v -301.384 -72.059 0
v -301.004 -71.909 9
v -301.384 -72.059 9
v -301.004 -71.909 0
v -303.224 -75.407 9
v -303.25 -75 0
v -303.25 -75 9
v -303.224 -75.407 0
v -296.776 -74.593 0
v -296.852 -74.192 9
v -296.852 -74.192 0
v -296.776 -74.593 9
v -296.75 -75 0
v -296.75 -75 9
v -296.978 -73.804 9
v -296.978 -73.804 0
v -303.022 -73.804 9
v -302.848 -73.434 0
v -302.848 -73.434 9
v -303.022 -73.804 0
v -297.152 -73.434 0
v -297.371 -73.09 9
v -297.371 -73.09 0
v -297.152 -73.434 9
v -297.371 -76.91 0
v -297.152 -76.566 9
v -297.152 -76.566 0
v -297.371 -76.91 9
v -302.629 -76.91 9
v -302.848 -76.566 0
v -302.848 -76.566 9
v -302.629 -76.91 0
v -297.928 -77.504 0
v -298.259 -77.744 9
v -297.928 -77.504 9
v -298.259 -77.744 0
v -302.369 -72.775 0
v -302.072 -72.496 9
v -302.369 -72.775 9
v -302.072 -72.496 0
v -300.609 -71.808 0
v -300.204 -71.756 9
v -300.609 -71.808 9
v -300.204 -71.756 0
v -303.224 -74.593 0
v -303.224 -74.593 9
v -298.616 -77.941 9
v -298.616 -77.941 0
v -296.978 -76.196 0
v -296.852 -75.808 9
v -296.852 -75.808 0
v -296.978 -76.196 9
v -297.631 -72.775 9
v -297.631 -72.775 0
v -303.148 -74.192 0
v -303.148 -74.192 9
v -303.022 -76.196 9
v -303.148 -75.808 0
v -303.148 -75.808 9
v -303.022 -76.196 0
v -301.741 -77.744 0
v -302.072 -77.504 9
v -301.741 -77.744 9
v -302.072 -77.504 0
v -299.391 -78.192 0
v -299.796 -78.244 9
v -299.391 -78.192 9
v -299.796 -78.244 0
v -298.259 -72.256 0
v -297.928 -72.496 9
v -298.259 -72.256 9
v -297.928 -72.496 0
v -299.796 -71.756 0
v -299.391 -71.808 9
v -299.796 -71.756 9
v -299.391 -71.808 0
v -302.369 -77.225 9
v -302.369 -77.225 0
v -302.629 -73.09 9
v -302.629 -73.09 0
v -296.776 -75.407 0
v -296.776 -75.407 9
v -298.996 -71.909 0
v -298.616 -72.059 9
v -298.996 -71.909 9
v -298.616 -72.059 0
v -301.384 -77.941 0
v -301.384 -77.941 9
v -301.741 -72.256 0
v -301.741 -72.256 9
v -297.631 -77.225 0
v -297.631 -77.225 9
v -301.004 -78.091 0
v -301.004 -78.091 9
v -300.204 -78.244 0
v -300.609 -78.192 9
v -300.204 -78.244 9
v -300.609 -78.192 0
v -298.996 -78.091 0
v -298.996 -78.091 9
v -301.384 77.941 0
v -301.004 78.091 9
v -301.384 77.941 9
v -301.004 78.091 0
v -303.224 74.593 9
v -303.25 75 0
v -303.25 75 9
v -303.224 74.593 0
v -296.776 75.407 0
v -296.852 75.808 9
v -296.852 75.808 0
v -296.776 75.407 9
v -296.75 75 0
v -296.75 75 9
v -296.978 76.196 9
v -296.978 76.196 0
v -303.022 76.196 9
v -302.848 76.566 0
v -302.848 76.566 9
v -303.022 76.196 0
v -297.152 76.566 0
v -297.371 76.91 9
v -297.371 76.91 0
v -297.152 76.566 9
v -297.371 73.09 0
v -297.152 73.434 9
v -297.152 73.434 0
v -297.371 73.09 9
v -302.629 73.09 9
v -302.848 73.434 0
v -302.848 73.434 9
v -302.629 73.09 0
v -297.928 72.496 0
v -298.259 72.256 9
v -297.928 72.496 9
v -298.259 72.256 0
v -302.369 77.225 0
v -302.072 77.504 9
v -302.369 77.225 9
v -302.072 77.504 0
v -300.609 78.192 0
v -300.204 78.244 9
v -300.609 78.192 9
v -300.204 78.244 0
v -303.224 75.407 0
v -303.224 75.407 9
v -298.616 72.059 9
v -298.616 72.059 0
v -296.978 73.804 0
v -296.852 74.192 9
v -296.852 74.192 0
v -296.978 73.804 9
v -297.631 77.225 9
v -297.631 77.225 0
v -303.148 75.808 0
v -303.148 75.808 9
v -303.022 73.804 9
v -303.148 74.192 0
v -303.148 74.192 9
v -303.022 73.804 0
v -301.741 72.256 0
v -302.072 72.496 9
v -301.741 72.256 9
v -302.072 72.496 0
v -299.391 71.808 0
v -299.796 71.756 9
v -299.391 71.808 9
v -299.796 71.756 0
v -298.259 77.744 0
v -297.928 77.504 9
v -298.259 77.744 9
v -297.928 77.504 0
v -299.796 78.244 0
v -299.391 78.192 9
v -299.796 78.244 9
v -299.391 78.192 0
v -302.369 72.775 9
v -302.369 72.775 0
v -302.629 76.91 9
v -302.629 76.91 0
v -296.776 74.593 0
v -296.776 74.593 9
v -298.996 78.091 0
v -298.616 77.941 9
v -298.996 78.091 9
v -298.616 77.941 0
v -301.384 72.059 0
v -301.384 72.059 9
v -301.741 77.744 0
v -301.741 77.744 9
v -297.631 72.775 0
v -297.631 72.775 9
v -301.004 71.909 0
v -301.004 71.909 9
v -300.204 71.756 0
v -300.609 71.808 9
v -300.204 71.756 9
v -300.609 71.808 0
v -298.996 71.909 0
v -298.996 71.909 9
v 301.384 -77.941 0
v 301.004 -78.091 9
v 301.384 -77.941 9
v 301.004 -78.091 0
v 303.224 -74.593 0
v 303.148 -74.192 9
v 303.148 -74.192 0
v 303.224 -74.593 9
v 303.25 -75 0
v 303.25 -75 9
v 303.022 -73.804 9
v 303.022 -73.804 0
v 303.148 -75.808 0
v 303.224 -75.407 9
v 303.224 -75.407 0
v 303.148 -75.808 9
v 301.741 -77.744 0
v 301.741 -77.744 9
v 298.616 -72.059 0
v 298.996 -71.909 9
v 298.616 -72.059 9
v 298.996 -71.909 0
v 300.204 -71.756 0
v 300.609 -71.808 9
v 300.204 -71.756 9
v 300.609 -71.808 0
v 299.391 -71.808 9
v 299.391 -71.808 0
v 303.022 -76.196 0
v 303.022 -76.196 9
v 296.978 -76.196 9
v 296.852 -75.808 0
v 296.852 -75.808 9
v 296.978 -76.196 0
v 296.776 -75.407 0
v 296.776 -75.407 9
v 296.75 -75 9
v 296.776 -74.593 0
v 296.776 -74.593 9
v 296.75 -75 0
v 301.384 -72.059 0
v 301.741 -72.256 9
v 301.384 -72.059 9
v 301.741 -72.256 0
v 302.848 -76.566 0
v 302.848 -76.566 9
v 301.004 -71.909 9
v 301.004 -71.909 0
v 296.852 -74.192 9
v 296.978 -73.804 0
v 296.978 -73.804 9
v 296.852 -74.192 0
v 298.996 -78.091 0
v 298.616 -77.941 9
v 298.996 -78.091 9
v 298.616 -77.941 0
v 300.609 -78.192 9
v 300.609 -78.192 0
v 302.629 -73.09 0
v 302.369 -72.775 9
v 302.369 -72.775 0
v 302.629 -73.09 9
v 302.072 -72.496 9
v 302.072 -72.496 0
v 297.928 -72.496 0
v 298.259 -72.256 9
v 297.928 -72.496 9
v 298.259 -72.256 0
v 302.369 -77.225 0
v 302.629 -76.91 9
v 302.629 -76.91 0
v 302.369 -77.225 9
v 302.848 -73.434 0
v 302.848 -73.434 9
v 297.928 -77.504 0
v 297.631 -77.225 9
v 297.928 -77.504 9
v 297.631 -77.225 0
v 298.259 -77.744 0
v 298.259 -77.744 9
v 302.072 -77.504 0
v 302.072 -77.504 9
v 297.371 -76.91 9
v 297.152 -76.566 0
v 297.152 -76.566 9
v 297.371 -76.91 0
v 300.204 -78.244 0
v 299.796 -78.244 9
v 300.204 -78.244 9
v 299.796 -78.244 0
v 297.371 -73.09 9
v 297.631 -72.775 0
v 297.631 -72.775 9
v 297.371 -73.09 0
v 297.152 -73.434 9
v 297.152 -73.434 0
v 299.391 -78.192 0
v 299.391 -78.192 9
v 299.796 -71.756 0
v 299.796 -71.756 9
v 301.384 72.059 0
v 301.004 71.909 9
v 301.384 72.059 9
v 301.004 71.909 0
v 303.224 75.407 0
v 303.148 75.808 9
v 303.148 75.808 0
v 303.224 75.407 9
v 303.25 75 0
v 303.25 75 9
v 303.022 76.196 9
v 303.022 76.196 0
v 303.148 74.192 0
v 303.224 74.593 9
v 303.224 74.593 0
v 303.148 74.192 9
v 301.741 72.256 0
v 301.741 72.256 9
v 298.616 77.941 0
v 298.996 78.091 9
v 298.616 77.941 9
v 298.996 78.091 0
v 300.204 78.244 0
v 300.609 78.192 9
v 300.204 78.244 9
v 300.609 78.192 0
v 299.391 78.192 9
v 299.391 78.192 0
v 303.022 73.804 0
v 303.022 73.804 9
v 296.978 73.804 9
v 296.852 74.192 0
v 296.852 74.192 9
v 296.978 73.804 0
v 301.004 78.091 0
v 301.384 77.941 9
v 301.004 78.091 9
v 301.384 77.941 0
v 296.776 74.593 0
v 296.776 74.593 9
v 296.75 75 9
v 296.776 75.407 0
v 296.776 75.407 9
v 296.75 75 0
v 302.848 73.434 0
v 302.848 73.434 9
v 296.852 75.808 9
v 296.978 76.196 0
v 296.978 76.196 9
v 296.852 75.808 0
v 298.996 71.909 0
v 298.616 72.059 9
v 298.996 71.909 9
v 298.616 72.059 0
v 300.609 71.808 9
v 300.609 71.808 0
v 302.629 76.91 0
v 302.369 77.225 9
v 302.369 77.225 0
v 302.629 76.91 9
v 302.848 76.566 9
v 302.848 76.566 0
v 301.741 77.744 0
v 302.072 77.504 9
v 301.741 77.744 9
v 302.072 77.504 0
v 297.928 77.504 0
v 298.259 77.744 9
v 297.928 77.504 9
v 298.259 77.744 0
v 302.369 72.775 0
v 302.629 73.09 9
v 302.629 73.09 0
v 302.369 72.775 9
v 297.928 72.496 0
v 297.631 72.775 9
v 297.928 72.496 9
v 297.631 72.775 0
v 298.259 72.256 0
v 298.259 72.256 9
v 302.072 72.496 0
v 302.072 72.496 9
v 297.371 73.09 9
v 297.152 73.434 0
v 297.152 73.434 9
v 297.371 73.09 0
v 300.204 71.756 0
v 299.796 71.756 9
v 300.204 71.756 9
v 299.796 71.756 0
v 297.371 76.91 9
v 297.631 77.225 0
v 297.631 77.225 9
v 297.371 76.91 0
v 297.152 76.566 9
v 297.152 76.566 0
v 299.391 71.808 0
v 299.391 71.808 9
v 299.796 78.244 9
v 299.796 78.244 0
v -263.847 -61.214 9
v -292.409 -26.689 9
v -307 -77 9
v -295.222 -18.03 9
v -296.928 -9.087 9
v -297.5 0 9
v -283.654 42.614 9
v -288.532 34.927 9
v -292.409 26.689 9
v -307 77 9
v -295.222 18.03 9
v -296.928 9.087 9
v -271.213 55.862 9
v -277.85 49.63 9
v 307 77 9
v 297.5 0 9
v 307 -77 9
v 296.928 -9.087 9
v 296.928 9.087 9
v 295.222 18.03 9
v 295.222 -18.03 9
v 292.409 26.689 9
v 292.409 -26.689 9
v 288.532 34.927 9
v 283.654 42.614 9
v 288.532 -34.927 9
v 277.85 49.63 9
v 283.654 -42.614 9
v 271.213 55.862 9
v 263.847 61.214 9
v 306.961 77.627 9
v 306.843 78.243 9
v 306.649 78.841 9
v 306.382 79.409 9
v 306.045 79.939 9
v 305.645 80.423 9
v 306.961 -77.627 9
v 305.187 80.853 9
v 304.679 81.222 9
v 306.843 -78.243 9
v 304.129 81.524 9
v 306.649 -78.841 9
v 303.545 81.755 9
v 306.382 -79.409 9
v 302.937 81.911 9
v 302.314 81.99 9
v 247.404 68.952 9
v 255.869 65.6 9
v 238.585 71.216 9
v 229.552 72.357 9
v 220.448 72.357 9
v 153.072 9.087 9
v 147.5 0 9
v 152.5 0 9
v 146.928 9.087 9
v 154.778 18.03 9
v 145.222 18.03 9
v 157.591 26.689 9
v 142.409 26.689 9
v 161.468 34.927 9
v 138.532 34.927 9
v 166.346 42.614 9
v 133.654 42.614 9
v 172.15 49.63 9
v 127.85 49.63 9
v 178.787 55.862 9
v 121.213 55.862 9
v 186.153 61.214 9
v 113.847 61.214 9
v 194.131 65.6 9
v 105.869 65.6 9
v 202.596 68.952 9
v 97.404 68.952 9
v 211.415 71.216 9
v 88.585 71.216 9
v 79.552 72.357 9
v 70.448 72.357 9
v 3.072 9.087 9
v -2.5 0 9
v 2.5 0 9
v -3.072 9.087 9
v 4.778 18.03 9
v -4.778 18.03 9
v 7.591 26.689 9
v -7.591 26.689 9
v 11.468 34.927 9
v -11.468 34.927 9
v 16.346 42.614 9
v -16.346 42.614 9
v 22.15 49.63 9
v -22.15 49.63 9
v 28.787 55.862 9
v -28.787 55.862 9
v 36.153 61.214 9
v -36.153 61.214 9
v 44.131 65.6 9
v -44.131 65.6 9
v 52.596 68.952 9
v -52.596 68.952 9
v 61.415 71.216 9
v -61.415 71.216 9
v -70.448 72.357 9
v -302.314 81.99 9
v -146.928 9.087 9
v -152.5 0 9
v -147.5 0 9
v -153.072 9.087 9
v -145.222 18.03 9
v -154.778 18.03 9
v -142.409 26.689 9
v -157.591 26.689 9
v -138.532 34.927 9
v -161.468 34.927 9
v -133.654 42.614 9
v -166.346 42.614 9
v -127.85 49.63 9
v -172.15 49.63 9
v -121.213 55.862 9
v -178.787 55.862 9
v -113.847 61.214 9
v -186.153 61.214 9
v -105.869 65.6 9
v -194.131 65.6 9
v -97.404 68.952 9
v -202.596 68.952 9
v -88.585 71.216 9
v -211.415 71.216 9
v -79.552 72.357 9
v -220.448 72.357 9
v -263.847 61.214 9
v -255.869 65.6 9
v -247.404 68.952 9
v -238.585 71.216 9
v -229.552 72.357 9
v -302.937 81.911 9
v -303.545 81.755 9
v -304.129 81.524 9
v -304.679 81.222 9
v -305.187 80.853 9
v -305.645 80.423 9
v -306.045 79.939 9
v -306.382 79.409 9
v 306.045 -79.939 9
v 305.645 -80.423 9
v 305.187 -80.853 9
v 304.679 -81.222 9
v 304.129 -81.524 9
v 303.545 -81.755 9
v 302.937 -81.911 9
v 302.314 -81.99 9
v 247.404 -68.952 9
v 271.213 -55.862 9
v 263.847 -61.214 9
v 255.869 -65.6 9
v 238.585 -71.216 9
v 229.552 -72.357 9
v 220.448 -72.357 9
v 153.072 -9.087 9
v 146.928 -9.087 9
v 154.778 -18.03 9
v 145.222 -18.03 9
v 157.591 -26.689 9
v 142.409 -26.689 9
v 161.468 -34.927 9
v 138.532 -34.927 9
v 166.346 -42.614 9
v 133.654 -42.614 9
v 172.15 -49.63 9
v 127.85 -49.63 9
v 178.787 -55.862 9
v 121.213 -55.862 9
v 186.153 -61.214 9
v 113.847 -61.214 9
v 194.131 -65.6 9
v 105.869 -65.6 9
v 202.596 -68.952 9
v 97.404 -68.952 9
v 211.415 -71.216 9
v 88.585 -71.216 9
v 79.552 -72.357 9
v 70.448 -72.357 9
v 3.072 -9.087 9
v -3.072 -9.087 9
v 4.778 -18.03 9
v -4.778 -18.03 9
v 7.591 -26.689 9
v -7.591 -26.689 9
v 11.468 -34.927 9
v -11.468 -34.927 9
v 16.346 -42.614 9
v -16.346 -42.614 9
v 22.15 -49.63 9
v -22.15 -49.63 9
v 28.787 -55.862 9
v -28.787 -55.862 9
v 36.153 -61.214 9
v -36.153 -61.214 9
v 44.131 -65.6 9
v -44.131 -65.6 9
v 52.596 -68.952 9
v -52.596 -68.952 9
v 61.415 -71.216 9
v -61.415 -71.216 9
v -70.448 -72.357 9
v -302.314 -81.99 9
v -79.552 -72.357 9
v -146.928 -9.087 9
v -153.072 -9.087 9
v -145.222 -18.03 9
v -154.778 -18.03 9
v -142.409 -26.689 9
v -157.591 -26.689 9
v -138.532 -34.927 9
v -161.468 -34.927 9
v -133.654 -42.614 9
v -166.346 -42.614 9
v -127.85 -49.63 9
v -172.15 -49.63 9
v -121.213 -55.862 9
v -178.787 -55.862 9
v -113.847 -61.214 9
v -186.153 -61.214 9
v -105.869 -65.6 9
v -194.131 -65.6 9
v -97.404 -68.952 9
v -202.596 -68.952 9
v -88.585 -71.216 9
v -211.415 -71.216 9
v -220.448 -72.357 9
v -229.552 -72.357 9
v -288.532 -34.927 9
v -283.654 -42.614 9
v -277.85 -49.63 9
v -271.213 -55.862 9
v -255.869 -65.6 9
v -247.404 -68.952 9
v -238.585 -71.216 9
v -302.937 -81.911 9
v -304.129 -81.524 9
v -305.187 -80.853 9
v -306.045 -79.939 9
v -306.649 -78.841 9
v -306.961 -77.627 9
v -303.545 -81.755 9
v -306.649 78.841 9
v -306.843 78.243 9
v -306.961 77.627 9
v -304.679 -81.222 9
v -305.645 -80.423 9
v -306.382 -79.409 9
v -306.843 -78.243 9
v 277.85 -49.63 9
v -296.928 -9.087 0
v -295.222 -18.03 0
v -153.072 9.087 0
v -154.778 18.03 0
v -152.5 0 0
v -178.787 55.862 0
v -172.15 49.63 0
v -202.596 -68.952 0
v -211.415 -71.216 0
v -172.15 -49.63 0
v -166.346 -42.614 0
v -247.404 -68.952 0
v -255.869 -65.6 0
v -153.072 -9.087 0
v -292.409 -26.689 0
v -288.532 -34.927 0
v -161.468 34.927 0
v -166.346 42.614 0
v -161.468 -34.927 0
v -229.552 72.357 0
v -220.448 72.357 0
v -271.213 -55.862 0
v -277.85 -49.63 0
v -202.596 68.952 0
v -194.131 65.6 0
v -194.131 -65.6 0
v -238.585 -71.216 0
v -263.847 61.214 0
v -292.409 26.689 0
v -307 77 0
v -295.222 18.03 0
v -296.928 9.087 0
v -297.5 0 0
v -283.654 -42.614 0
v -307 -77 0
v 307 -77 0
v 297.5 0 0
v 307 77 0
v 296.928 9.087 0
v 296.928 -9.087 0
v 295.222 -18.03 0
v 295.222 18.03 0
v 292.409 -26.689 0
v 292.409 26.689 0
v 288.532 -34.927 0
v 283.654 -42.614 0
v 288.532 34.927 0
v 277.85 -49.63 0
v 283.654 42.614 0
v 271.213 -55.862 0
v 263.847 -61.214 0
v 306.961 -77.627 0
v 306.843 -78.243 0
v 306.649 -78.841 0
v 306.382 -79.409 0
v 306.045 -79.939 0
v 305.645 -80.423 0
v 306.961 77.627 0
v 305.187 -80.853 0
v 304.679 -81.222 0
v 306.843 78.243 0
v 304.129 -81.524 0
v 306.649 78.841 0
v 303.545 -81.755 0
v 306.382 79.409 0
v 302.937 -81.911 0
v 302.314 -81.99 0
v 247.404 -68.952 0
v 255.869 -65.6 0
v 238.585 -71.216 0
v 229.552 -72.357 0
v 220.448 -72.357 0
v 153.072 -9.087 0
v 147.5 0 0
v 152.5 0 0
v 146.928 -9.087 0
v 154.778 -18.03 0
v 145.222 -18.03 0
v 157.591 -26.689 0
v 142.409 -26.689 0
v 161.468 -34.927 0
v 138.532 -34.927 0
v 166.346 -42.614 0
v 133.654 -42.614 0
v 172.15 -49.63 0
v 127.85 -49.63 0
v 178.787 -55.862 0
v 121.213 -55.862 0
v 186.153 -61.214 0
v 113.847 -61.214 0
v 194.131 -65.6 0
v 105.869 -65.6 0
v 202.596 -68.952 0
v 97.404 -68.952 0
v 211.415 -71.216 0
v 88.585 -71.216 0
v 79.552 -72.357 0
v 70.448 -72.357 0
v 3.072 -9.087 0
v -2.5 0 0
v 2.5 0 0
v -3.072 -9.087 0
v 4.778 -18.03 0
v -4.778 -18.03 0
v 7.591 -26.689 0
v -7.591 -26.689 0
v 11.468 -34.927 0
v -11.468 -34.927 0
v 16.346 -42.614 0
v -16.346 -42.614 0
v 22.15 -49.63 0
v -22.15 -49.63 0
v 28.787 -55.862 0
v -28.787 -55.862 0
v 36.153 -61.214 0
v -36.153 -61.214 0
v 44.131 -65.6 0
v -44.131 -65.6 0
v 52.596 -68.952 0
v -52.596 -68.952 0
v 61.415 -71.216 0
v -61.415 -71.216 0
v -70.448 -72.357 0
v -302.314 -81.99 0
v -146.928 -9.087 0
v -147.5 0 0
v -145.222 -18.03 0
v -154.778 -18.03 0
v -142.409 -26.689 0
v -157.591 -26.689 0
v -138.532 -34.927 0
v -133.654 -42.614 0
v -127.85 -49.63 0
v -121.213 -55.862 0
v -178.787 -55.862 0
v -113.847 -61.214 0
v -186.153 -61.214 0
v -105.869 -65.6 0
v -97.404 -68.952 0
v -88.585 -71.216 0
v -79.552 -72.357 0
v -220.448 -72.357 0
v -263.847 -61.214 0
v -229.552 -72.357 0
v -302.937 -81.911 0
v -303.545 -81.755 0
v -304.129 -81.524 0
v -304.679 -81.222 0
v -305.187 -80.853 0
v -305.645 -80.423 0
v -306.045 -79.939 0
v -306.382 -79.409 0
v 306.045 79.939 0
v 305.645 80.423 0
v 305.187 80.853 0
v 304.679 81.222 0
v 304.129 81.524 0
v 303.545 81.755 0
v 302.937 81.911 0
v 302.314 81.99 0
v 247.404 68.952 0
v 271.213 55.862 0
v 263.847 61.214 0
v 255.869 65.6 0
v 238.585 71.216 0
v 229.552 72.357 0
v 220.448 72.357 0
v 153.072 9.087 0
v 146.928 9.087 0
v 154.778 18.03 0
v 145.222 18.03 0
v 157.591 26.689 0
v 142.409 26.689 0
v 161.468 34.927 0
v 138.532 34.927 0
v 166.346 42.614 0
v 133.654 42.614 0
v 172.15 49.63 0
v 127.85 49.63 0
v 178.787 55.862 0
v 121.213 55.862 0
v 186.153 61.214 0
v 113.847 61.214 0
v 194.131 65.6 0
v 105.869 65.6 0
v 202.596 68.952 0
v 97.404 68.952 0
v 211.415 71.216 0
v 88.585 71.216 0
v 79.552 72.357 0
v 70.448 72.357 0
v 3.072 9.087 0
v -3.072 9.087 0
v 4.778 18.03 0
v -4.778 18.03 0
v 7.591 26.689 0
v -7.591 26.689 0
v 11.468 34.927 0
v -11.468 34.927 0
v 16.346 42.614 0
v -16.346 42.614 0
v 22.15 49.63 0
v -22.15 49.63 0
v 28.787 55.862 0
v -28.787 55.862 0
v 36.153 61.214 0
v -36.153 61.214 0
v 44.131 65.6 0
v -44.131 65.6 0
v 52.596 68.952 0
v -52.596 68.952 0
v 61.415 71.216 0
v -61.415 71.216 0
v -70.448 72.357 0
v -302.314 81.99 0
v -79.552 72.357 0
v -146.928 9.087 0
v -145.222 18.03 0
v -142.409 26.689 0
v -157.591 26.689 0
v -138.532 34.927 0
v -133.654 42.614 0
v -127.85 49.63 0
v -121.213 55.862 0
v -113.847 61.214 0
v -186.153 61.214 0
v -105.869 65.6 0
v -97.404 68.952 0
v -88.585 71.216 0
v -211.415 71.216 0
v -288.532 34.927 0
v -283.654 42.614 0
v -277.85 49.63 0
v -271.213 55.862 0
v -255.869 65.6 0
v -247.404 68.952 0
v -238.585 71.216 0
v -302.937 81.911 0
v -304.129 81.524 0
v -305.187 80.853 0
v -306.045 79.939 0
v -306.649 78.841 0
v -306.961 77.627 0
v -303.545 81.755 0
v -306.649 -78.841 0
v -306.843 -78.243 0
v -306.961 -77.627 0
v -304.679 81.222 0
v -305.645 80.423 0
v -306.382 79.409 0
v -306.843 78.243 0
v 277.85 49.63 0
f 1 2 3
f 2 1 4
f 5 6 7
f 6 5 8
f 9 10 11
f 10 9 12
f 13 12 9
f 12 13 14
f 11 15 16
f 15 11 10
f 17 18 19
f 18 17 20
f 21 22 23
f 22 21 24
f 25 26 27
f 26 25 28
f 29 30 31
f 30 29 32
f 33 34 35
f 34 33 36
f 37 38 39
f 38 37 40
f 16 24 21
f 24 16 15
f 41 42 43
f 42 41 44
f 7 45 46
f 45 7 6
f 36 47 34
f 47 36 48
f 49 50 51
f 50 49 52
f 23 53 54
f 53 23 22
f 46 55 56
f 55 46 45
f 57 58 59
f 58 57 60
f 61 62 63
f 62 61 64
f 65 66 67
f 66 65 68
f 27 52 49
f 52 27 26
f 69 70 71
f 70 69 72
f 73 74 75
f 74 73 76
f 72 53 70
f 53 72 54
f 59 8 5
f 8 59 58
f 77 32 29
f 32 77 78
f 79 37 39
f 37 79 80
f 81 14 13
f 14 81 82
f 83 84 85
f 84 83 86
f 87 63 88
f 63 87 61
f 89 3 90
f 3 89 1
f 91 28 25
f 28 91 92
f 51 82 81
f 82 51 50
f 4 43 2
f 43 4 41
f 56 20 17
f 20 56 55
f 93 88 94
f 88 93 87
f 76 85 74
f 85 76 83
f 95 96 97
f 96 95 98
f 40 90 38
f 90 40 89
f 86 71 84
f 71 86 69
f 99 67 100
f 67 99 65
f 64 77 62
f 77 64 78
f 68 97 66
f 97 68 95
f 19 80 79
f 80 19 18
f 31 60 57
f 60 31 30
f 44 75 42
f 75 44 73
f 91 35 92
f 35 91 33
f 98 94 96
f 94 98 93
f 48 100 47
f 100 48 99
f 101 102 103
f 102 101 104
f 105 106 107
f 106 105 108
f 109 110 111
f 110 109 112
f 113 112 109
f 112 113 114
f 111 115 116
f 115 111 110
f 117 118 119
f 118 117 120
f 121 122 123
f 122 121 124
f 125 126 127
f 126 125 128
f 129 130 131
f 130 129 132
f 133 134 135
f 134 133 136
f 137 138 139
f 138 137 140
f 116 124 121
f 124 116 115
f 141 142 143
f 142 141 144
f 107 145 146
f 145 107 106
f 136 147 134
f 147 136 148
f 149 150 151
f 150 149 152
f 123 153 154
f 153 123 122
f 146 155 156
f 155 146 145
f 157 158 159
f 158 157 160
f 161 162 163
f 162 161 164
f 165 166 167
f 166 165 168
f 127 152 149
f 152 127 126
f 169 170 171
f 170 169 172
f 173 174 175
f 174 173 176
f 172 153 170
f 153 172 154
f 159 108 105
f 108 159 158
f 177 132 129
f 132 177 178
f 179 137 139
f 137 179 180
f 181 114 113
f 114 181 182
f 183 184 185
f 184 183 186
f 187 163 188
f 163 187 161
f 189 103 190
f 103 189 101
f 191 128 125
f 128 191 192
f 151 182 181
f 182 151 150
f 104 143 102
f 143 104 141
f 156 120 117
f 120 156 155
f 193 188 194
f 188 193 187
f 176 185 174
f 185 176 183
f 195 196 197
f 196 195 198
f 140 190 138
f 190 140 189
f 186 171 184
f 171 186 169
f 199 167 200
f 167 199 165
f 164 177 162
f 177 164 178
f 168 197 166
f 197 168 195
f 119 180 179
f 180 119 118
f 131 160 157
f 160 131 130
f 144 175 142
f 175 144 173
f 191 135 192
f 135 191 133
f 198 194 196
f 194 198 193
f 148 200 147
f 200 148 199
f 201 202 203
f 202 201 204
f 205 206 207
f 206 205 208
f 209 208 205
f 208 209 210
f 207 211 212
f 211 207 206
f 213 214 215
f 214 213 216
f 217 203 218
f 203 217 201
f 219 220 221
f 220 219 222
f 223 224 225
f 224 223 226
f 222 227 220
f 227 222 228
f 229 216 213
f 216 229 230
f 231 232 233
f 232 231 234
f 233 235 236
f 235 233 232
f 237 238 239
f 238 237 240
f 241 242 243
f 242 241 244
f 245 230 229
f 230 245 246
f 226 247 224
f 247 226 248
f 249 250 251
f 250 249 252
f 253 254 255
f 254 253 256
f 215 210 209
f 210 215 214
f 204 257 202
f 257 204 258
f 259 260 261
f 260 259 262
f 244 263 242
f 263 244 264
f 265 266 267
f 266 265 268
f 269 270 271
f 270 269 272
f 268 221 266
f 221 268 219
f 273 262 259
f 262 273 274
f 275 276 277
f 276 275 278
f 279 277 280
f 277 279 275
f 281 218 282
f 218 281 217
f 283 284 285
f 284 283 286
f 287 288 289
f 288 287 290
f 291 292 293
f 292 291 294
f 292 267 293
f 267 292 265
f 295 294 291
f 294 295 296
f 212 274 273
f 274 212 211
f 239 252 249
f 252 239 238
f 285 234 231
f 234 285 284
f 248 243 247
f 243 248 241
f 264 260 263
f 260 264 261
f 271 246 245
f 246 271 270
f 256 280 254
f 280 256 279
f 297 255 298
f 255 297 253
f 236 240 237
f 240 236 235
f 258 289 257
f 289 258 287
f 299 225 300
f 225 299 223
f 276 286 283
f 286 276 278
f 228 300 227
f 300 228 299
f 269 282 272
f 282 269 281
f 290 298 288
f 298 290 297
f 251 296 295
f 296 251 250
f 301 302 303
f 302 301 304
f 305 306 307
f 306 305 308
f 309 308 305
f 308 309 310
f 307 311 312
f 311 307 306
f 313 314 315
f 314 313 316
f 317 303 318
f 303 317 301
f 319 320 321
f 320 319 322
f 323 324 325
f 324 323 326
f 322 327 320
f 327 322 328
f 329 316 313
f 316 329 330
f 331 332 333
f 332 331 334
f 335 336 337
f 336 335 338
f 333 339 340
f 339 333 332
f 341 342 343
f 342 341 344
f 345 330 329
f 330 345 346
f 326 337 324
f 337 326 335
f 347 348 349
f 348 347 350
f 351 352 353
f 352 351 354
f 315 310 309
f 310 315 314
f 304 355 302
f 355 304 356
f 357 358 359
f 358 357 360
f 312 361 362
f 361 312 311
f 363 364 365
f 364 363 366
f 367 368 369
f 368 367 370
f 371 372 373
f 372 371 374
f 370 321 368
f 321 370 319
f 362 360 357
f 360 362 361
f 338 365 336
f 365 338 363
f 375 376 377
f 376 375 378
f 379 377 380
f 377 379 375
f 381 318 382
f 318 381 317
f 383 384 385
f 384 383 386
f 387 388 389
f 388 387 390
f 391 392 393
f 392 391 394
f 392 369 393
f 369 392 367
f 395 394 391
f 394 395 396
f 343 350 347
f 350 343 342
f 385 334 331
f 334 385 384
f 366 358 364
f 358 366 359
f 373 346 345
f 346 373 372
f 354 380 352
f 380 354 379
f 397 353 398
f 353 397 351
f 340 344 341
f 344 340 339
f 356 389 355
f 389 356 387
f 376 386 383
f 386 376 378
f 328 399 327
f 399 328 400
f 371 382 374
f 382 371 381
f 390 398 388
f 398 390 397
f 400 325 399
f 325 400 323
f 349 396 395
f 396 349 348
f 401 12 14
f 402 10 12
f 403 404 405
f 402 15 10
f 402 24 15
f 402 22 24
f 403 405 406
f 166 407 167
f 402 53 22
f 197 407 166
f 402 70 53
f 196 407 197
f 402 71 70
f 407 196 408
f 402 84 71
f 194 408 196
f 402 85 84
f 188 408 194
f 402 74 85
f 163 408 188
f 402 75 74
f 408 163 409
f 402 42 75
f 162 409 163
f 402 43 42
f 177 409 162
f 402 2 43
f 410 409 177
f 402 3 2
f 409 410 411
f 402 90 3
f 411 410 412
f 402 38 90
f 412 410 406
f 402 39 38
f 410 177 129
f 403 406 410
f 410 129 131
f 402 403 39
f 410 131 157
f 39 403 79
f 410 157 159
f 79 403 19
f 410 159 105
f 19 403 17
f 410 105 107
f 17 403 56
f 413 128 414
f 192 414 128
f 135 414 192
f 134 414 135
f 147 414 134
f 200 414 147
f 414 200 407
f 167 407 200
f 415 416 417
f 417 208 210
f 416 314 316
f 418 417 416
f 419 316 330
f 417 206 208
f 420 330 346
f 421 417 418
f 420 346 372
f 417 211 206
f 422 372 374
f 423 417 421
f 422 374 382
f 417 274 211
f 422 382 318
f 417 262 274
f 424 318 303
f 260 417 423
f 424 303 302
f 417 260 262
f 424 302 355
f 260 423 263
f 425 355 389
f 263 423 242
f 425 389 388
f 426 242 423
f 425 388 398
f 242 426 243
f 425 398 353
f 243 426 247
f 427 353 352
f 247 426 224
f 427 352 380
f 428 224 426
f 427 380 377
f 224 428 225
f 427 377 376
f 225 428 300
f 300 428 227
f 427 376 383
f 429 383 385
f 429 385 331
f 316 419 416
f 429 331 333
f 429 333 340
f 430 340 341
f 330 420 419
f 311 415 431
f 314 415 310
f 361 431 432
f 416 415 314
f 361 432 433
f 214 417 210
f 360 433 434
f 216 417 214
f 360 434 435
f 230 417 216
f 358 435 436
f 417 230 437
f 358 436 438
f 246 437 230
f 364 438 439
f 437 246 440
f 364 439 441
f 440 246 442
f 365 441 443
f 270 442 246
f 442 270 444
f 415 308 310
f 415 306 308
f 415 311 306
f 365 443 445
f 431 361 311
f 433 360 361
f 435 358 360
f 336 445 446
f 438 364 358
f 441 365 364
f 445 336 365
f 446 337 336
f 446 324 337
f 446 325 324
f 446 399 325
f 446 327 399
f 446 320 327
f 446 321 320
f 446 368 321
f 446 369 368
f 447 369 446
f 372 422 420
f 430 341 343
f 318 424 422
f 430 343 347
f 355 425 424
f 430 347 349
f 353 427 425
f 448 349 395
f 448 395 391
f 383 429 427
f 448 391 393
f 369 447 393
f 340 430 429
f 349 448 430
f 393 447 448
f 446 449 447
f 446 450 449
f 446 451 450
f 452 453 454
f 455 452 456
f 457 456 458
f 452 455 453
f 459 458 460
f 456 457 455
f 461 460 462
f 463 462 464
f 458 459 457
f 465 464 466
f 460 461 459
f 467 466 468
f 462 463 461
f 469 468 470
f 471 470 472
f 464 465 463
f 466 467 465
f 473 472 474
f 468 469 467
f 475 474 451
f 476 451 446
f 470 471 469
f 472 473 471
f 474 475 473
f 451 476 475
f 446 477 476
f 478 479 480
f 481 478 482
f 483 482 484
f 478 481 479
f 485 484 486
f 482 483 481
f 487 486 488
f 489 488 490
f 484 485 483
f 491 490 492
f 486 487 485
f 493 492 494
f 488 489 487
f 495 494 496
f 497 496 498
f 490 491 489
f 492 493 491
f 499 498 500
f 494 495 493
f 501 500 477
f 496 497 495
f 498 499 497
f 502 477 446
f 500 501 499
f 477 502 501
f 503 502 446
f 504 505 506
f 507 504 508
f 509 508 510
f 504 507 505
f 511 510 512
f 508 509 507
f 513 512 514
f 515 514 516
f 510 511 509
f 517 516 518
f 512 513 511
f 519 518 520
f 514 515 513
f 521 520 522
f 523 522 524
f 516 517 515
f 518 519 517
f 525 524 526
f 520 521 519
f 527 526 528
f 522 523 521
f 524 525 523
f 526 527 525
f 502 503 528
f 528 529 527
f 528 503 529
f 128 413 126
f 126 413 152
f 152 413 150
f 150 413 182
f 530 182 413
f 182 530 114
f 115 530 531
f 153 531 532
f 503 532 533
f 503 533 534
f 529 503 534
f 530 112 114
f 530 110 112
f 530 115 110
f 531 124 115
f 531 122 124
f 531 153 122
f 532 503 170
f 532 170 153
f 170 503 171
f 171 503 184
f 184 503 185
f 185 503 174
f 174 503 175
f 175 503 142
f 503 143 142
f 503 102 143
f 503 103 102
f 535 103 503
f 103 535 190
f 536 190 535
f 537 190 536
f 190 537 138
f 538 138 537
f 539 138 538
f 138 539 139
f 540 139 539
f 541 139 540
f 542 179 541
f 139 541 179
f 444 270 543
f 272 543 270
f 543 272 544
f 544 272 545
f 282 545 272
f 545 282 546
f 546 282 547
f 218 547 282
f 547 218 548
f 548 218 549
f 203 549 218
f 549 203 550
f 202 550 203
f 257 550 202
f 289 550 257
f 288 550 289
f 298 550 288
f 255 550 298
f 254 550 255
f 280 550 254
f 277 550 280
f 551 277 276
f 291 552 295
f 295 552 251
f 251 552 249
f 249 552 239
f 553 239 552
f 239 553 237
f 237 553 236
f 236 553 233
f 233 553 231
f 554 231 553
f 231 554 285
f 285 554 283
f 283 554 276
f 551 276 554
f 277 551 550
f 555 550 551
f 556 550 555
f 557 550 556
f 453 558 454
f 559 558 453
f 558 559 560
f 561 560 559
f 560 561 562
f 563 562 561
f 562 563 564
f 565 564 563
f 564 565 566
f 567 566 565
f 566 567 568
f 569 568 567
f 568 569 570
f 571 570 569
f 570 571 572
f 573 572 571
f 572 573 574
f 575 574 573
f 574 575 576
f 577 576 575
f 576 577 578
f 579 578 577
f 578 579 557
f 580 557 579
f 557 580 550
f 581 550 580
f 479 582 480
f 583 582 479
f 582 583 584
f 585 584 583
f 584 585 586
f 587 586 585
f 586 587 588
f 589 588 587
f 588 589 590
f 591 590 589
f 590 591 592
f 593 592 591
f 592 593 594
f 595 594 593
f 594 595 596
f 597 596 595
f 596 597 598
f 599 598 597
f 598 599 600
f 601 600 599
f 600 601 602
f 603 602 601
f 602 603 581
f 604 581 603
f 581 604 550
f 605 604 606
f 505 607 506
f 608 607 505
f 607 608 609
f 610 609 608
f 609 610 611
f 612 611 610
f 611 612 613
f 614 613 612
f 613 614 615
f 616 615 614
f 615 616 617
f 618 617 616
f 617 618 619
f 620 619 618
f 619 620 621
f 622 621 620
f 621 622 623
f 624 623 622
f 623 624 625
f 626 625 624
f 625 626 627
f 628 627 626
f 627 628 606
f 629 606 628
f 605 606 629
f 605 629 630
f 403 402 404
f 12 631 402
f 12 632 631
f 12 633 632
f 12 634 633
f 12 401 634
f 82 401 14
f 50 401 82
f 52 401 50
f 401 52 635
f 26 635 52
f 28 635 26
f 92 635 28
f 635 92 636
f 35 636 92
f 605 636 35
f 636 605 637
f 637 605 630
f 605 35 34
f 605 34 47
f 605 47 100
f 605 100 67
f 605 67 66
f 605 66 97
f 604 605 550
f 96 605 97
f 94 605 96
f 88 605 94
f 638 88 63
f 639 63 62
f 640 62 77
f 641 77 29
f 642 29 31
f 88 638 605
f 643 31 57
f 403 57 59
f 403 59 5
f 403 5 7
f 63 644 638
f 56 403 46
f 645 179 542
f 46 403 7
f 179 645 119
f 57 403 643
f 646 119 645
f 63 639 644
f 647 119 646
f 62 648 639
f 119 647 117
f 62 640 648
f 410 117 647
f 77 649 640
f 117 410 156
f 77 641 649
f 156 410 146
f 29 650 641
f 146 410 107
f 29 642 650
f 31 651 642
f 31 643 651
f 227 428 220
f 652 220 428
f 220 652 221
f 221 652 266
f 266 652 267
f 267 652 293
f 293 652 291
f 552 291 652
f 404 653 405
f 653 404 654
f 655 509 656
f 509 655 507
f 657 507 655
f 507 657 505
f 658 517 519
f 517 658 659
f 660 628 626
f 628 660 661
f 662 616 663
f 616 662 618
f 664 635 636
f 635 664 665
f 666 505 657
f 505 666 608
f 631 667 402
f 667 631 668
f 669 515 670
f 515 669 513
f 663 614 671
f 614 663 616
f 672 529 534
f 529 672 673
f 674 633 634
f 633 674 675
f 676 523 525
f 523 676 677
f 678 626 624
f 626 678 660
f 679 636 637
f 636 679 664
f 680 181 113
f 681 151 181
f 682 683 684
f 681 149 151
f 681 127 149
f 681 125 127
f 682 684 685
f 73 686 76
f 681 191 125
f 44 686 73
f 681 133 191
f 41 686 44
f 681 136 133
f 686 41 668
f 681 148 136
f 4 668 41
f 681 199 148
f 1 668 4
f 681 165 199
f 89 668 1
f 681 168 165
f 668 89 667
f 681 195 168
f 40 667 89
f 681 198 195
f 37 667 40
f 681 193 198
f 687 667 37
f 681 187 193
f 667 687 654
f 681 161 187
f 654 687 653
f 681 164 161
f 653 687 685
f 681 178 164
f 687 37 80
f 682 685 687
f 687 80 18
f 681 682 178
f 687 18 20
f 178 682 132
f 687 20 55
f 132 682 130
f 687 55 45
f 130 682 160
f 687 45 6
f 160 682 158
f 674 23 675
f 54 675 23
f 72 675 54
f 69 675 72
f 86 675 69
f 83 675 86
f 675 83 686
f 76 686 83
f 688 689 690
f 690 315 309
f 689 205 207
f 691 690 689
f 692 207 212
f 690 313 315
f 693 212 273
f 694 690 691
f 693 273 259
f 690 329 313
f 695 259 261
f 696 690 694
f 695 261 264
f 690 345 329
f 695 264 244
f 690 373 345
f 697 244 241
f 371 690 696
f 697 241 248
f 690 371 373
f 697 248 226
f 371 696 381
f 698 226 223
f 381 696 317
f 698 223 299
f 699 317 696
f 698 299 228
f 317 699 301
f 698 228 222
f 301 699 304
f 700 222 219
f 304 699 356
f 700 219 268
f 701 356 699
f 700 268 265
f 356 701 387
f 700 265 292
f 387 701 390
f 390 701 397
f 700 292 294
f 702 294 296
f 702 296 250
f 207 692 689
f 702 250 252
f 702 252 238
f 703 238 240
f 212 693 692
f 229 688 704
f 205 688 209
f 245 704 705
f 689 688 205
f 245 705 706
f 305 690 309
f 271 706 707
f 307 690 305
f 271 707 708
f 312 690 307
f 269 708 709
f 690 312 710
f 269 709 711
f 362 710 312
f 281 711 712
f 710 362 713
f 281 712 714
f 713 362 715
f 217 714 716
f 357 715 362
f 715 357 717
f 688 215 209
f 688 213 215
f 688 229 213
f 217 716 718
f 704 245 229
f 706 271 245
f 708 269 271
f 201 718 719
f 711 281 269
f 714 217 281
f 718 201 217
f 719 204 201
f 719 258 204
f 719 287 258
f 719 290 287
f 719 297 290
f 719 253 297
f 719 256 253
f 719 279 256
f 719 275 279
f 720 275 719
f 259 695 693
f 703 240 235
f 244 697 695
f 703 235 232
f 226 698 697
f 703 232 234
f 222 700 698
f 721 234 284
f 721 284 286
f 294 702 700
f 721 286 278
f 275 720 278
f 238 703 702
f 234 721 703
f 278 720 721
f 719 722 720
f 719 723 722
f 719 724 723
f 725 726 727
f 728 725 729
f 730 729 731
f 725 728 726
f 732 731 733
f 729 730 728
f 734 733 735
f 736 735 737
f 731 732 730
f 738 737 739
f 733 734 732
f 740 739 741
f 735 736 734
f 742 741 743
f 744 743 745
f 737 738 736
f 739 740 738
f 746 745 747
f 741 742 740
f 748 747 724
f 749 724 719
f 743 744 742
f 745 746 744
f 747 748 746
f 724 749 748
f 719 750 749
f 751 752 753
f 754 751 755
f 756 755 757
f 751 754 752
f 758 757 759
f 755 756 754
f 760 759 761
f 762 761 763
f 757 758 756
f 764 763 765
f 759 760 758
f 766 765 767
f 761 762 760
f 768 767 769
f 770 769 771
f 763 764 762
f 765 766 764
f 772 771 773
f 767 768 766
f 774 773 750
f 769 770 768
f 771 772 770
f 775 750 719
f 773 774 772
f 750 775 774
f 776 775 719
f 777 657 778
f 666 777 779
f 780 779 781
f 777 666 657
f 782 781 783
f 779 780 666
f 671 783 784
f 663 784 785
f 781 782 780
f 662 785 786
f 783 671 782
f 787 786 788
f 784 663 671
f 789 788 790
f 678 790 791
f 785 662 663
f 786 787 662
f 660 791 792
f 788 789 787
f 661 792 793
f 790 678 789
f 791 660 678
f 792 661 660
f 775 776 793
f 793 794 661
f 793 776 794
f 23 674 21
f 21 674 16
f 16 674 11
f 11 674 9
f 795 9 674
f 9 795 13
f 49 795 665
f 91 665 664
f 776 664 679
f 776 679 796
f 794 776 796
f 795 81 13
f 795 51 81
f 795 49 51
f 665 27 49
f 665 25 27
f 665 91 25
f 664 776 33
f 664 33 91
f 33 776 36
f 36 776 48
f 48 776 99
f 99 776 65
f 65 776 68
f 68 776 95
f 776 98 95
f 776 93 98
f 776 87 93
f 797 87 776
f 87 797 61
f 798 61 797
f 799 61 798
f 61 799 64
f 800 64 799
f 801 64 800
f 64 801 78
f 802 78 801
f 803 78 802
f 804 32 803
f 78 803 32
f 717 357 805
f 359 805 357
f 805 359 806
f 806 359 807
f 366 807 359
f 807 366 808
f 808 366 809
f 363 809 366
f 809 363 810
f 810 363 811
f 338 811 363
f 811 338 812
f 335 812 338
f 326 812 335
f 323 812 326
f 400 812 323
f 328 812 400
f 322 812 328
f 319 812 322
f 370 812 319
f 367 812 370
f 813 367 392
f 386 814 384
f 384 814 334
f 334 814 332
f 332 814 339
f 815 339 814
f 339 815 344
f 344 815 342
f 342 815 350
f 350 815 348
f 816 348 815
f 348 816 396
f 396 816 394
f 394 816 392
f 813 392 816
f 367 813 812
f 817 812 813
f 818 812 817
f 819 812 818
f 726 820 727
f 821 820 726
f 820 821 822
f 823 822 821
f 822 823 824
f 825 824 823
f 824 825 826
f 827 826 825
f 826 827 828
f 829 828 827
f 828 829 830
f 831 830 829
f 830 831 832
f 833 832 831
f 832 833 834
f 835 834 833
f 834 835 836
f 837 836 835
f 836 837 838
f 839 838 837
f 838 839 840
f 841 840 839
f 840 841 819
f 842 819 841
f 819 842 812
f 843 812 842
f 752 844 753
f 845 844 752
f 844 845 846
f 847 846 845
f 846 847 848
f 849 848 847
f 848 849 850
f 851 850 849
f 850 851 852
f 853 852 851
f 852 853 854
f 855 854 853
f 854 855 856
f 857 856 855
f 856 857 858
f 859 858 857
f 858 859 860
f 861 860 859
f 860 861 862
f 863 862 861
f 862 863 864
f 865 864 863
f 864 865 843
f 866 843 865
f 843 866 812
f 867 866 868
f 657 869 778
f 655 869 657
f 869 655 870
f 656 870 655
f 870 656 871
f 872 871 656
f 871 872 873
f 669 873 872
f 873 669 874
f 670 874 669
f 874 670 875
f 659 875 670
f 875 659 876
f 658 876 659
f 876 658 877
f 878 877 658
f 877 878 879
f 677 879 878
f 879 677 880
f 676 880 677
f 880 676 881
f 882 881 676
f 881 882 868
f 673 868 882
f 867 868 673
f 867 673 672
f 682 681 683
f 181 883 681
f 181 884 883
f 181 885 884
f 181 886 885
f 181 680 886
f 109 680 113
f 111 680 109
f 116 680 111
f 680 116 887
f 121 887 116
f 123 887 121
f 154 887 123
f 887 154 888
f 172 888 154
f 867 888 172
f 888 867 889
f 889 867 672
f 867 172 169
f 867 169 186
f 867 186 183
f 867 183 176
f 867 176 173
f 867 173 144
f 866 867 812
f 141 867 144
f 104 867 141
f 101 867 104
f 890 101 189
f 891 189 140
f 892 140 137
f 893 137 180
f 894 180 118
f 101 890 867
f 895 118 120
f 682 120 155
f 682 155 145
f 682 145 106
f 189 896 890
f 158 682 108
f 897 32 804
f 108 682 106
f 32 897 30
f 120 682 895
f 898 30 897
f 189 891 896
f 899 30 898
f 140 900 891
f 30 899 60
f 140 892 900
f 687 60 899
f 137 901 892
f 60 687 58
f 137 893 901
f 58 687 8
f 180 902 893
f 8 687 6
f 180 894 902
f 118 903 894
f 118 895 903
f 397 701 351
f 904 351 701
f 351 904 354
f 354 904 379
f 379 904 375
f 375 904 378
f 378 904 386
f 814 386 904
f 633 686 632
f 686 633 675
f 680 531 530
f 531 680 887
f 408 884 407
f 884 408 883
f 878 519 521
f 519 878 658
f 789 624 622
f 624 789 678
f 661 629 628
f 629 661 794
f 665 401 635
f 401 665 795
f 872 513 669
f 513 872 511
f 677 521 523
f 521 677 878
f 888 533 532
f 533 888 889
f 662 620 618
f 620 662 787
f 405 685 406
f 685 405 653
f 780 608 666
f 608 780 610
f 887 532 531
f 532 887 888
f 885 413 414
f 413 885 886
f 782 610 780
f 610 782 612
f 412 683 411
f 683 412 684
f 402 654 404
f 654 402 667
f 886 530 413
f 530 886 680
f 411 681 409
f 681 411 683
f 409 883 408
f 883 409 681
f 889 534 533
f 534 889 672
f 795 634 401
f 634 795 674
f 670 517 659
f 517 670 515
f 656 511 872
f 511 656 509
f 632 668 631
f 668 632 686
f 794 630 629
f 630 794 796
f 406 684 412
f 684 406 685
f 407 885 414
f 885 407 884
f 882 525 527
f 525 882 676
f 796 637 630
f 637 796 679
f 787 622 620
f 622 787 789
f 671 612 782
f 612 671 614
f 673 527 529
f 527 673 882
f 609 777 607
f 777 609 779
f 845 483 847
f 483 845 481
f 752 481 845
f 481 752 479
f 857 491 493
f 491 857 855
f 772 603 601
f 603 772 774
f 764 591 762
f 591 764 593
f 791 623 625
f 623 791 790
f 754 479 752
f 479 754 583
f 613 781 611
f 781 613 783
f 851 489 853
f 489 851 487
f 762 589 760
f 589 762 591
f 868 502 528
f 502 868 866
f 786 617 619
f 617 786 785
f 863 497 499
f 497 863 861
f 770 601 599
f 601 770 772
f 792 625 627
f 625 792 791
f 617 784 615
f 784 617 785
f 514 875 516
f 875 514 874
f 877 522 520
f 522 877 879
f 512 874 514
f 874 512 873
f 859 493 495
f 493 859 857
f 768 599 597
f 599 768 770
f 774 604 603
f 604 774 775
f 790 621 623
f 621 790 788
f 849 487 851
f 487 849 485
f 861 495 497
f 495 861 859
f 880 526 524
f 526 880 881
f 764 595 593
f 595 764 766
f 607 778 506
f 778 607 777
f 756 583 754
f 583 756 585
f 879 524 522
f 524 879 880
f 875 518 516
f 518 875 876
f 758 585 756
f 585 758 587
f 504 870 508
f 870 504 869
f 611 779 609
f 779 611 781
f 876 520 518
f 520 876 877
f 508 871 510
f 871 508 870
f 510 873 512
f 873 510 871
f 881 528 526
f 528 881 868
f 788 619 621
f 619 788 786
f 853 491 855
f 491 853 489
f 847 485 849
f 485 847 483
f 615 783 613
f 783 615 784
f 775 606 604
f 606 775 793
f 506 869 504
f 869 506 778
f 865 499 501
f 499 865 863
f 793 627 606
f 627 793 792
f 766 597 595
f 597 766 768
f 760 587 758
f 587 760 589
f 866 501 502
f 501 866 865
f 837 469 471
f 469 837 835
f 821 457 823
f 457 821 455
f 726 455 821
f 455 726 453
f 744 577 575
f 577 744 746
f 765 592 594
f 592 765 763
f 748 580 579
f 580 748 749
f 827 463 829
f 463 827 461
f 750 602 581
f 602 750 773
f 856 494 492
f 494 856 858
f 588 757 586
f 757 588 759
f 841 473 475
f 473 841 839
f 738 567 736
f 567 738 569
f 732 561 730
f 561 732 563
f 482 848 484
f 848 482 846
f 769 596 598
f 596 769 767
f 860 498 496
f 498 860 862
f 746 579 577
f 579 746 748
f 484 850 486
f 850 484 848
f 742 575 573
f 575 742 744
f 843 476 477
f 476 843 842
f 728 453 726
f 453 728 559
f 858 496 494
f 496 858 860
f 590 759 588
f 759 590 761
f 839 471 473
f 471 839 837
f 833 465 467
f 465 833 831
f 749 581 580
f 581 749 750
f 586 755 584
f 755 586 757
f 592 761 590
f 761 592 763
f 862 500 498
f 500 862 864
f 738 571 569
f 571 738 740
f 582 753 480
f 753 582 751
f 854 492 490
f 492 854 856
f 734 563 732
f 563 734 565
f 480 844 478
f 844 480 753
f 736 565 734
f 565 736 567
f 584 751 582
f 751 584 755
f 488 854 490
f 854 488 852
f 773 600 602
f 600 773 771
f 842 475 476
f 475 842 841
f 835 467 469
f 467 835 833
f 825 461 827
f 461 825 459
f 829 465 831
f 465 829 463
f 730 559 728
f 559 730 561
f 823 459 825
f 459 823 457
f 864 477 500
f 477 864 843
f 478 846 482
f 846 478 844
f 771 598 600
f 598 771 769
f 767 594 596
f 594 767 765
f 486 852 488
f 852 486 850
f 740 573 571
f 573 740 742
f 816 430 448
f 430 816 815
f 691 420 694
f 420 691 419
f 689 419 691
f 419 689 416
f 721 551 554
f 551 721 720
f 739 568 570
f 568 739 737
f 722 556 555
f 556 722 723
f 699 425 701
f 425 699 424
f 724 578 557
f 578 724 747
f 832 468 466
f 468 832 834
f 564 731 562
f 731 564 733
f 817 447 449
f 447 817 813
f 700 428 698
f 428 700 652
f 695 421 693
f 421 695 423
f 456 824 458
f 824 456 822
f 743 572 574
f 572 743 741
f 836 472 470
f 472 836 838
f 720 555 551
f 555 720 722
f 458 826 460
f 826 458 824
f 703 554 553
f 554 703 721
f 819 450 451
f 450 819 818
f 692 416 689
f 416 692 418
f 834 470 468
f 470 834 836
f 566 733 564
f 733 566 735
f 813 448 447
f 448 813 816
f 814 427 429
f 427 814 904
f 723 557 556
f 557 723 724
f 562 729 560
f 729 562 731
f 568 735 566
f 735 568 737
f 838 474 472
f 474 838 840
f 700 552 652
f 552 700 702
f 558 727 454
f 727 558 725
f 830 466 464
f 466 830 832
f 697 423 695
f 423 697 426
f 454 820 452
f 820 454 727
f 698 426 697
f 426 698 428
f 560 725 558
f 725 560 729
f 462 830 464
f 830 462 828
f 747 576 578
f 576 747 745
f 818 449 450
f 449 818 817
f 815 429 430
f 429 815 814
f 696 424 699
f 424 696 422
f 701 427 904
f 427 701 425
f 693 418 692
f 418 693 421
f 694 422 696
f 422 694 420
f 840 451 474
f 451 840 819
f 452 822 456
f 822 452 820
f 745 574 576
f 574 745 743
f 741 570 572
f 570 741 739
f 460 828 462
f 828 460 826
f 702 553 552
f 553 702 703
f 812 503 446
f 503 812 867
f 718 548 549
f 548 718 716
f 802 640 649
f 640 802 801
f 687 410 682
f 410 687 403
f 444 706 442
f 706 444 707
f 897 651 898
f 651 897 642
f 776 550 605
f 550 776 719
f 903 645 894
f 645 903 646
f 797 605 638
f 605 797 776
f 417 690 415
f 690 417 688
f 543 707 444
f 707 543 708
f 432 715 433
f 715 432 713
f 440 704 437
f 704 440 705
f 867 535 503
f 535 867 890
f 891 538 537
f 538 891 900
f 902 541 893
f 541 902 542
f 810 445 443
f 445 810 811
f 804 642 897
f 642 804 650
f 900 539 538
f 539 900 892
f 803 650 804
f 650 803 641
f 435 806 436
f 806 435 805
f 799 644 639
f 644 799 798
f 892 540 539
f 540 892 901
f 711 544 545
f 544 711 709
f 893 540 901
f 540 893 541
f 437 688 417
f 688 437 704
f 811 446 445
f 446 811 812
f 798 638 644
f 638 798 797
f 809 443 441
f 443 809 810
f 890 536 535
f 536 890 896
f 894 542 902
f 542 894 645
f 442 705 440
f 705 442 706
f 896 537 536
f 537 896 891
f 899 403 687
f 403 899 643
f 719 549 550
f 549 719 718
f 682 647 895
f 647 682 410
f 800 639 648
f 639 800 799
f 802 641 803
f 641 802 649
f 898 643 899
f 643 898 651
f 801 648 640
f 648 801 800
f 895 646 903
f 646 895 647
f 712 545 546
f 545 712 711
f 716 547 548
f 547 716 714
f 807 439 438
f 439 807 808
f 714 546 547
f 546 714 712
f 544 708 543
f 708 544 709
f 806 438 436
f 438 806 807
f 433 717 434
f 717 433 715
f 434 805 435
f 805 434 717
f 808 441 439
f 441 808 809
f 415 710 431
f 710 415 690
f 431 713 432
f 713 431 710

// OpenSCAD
$fn = 50;

difference() {
	union() {
		hull() {
			translate(v = [-302.0, 77.0, 0]) {
				cylinder(h = 9, r = 5);
			}
			translate(v = [302.0, 77.0, 0]) {
				cylinder(h = 9, r = 5);
			}
			translate(v = [-302.0, -77.0, 0]) {
				cylinder(h = 9, r = 5);
			}
			translate(v = [302.0, -77.0, 0]) {
				cylinder(h = 9, r = 5);
			}
		}
	}
	union() {
		translate(v = [-300.0, -75.0, -100.0]) {
			cylinder(h = 200, r = 3.25);
		}
		translate(v = [-300.0, 75.0, -100.0]) {
			cylinder(h = 200, r = 3.25);
		}
		translate(v = [300.0, -75.0, -100.0]) {
			cylinder(h = 200, r = 3.25);
		}
		translate(v = [300.0, 75.0, -100.0]) {
			cylinder(h = 200, r = 3.25);
		}
		translate(v = [-300.0, -75.0, -100.0]) {
			cylinder(h = 200, r = 1.8);
		}
		translate(v = [-300.0, 75.0, -100.0]) {
			cylinder(h = 200, r = 1.8);
		}
		translate(v = [300.0, -75.0, -100.0]) {
			cylinder(h = 200, r = 1.8);
		}
		translate(v = [300.0, 75.0, -100.0]) {
			cylinder(h = 200, r = 1.8);
		}
		translate(v = [-225.0, 0, 0.0]) {
			cylinder(h = 9, r = 72.5);
		}
		translate(v = [-75.0, 0, 0.0]) {
			cylinder(h = 9, r = 72.5);
		}
		translate(v = [75.0, 0, 0.0]) {
			cylinder(h = 9, r = 72.5);
		}
		translate(v = [225.0, 0, 0.0]) {
			cylinder(h = 9, r = 72.5);
		}
	}
}
